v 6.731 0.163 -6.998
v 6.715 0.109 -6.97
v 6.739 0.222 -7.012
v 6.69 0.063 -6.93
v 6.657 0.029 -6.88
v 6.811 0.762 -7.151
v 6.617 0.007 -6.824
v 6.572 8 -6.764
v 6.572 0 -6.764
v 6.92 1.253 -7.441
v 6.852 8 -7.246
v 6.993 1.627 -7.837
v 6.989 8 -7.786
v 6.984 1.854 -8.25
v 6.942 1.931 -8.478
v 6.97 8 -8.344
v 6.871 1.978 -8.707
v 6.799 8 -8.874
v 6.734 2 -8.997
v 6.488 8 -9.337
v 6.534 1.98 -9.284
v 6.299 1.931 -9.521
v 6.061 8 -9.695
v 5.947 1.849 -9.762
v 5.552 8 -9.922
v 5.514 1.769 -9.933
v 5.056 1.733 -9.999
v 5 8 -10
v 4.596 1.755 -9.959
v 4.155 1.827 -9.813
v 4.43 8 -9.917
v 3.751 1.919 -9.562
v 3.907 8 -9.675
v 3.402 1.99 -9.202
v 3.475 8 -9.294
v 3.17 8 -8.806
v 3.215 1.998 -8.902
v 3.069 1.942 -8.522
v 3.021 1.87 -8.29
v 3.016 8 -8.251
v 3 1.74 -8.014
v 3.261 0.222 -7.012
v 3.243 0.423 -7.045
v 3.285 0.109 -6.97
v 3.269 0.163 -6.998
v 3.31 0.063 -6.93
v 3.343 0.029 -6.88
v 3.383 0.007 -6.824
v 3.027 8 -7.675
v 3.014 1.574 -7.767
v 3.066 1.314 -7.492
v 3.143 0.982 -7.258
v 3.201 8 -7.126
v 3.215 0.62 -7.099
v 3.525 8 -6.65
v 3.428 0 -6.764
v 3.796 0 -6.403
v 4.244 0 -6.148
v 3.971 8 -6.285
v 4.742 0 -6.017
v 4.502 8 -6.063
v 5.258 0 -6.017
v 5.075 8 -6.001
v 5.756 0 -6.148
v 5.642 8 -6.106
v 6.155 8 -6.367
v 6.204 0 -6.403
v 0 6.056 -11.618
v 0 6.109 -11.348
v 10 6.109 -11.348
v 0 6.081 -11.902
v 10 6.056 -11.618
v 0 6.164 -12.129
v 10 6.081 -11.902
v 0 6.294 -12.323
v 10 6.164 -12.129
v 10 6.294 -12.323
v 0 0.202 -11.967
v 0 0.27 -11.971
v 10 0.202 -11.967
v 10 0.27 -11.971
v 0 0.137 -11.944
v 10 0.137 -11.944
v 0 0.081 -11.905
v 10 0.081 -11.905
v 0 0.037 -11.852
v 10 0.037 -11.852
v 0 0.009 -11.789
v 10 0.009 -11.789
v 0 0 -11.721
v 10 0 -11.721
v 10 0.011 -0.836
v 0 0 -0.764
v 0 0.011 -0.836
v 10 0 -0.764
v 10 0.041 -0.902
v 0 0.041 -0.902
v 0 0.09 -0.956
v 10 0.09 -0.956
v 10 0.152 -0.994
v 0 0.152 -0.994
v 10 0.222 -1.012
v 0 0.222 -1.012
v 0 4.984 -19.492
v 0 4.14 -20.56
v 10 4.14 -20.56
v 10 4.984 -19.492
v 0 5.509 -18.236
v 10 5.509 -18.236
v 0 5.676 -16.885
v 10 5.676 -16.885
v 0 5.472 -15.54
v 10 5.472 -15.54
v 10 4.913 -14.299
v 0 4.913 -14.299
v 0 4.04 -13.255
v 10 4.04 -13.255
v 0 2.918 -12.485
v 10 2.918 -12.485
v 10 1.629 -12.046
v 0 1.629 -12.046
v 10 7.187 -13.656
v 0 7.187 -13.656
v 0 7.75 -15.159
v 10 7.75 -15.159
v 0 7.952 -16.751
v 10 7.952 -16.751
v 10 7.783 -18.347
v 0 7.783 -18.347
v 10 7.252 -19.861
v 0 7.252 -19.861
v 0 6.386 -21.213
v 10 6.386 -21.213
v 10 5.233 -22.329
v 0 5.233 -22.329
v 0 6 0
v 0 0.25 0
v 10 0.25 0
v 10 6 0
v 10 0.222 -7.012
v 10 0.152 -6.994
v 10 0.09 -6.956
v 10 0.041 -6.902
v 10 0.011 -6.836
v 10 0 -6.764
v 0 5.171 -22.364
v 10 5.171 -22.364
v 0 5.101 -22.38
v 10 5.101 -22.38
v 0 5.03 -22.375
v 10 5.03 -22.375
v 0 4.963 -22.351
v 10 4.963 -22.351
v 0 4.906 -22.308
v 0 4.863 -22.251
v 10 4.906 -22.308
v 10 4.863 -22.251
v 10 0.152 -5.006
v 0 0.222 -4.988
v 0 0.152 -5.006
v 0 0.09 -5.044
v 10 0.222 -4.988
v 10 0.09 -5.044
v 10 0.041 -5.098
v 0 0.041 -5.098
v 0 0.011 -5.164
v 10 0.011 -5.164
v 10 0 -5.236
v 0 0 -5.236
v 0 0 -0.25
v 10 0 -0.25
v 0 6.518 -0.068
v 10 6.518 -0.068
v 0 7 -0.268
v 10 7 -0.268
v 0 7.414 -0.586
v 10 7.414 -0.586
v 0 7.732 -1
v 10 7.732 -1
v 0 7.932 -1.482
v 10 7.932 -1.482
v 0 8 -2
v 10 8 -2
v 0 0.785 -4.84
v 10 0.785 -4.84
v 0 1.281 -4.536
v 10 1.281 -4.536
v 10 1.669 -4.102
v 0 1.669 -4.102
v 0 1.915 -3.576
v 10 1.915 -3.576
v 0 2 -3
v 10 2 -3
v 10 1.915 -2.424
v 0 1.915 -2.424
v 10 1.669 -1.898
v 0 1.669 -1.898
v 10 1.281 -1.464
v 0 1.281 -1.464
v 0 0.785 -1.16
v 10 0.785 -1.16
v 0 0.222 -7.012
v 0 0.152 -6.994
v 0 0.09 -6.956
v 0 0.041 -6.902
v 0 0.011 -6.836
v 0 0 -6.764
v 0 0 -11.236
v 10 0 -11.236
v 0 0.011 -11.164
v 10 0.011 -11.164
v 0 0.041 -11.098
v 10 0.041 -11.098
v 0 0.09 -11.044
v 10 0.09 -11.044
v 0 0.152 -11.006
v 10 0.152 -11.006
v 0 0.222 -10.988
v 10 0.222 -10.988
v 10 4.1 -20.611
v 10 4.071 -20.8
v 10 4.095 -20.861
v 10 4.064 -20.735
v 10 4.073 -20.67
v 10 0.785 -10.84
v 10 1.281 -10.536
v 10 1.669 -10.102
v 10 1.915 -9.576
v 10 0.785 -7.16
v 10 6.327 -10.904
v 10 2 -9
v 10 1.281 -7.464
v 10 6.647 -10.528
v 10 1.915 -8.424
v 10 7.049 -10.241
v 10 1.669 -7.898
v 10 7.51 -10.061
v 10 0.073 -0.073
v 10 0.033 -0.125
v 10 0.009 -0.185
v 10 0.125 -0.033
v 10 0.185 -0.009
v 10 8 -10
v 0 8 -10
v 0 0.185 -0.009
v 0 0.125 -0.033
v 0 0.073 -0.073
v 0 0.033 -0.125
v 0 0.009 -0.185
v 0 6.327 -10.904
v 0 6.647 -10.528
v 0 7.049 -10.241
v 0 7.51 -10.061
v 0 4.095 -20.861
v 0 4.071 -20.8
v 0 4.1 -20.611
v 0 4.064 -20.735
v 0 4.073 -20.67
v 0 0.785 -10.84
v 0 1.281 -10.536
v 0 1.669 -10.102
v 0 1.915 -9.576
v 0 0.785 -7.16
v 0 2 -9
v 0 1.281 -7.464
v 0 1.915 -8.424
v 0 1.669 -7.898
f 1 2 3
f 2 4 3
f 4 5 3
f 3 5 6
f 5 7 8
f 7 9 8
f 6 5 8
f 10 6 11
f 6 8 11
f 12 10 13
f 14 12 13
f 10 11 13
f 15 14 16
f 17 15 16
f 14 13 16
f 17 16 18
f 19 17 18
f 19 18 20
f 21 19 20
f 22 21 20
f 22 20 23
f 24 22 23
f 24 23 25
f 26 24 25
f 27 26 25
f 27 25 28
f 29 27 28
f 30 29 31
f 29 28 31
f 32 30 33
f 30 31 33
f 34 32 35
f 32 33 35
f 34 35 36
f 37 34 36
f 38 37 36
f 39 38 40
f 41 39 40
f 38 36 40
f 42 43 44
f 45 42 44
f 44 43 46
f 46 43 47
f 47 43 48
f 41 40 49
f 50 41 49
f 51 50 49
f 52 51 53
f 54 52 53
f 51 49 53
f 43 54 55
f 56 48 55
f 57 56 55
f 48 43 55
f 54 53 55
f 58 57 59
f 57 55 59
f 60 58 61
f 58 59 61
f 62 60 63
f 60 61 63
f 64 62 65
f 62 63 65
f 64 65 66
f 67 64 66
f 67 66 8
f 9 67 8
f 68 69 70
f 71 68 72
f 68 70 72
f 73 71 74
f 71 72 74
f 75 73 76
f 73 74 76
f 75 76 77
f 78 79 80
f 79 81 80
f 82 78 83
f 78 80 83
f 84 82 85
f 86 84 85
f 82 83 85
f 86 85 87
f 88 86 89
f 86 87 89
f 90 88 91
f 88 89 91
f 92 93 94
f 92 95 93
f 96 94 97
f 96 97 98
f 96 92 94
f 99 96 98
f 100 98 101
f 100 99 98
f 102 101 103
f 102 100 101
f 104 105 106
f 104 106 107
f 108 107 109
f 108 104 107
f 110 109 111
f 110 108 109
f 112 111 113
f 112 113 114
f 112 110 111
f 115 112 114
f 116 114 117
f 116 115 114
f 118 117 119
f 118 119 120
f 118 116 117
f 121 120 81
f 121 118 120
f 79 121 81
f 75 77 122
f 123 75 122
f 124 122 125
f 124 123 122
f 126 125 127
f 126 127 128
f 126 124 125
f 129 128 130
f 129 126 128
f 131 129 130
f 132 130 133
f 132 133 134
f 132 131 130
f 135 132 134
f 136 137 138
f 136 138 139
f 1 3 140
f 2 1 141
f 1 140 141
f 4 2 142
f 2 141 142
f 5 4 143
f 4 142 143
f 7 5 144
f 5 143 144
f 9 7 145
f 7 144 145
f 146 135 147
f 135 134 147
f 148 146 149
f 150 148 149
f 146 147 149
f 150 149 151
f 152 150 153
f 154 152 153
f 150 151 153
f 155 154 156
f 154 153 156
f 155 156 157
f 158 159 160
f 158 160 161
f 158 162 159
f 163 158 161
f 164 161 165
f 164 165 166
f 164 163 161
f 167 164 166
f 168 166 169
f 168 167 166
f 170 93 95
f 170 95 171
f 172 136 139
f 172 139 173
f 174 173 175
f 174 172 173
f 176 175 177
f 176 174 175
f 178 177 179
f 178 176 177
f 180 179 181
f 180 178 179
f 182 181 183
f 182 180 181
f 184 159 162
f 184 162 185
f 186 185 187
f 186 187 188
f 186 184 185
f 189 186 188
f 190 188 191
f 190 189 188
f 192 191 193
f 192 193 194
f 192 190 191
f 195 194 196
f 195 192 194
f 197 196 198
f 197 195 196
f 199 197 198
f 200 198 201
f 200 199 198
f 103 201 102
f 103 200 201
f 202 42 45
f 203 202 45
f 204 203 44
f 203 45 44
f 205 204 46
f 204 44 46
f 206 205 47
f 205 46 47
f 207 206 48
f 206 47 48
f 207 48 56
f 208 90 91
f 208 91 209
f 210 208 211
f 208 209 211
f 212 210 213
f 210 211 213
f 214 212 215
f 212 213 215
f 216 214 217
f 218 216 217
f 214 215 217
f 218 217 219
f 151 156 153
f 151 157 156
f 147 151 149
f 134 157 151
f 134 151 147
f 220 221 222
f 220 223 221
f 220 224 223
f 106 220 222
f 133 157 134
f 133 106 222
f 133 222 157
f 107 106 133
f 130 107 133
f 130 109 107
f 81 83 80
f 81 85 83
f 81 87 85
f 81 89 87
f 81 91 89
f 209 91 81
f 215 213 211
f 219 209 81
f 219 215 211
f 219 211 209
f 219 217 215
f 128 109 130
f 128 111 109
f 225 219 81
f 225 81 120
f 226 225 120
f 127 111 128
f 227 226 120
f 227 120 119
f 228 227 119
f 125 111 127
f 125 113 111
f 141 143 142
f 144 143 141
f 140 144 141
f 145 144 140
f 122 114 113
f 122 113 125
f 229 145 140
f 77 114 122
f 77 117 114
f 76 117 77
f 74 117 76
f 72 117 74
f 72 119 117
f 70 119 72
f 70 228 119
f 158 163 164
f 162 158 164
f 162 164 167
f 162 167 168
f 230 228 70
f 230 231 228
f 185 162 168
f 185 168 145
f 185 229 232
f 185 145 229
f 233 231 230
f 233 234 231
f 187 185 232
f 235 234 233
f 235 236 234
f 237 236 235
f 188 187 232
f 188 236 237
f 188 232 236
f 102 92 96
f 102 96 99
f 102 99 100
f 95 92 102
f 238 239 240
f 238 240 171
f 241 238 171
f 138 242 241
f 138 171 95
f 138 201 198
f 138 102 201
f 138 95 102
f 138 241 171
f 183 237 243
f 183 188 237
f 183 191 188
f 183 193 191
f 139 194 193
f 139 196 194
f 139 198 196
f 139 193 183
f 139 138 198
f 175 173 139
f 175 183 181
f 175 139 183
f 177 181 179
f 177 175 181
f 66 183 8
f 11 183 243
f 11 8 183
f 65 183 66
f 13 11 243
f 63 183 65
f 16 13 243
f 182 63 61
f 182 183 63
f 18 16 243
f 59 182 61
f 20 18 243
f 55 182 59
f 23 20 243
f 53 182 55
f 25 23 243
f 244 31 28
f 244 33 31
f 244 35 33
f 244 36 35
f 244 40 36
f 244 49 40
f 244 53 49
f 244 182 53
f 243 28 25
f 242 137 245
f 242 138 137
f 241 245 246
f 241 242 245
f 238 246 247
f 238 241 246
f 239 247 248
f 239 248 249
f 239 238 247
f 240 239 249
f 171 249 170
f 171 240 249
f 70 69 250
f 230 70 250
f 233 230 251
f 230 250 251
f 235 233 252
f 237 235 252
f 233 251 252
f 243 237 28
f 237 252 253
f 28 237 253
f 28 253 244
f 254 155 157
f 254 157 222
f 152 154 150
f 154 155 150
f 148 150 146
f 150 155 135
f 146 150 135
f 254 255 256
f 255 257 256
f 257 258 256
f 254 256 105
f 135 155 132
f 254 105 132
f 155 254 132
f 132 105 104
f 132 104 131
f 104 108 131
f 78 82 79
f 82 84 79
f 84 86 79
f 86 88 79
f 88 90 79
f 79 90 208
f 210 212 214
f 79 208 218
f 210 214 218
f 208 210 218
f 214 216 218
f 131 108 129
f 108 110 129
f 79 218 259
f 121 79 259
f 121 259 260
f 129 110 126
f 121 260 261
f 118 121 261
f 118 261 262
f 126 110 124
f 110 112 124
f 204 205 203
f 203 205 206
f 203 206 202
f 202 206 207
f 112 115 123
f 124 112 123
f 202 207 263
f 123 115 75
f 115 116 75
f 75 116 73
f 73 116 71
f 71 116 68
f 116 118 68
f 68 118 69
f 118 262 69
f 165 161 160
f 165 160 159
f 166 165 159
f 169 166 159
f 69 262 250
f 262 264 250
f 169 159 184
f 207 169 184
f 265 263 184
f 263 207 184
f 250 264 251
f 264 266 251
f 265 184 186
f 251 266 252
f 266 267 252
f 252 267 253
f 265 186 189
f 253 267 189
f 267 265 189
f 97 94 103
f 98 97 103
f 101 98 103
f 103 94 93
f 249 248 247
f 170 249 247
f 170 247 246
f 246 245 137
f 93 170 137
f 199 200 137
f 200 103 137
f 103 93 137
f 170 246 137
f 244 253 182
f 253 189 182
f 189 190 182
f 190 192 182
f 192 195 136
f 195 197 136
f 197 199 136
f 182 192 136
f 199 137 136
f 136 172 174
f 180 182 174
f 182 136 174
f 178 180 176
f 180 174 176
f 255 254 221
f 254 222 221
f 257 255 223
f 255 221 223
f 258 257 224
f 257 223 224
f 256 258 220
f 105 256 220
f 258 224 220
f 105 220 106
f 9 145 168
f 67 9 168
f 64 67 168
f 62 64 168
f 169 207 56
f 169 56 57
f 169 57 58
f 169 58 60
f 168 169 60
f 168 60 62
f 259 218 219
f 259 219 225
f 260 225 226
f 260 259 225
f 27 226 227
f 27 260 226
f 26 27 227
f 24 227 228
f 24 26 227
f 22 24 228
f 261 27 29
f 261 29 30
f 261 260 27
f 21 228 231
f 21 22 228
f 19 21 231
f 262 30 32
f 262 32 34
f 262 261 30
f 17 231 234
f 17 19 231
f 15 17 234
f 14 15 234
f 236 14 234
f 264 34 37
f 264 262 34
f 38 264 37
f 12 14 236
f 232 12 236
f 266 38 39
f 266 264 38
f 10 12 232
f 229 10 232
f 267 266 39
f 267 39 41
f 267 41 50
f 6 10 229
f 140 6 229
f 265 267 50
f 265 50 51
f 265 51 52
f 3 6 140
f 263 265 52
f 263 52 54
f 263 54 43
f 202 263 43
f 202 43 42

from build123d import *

# Parameters (mm, degrees)
BOSS_EXTRUDE1_DEPTH = 10
FILLET1_START       = -1
FILLET1_DEPTH       = 12
FILLET1_2_DEPTH     = 10
FILLET2_R           = 1
FILLET3_R           = 0.25
SKETCH2_R           = 2
CUT_EXTRUDE1_DEPTH  = 26.785330572


with BuildPart() as part:
    # Sketch1 → Boss-Extrude1 (new body)
    with BuildSketch(Plane(origin=(0, 0, 0), x_dir=(0, 0, -1), z_dir=(1, 0, 0))):
        with BuildLine():
            Line((0, 0), (0, 8))
            Line((0, 8), (10, 8))
            Line((10, 8), (10, 6))
            Line((10, 6), (12, 6))
            ThreePointArc((12, 6), (17.480620462, 7.92151485), (22.5, 5))
            Line((22.5, 5), (20.689313396, 4))
            ThreePointArc((20.689313396, 4), (14.863284967, 5.218025808), (12, 0))
            Line((12, 0), (11, 0))
            ThreePointArc((11, 0), (9, 2), (7, 0))
            Line((7, 0), (5, 0))
            ThreePointArc((5, 0), (3, 2), (1, 0))
            Line((1, 0), (0, 0))
        make_face()
    extrude(amount=BOSS_EXTRUDE1_DEPTH)

    # Fillet1: read off the stored shape, not the designer's step
    # Fillet1 outline → Fillet1 (cut)
    with BuildSketch(Plane.YZ.offset(FILLET1_START)):
        with BuildLine():
            ThreePointArc((6, 0), (7.414213562, -0.585786438), (8, -2))
            Line((8, -2), (8, 0))
            Line((8, 0), (6, 0))
        make_face()
    extrude(amount=FILLET1_DEPTH, mode=Mode.SUBTRACT)

    # Fillet1 2 outline → Fillet1 2 (add)
    with BuildSketch(Plane.YZ):
        with BuildLine():
            ThreePointArc((6, -12), (6.585786438, -10.585786438), (8, -10))
            Line((8, -10), (6, -10))
            Line((6, -10), (6, -12))
        make_face()
    extrude(amount=FILLET1_2_DEPTH)

    # Fillet2
    fillet2_edges = [part.edges().sort_by_distance(p)[0] for p in [
        (5, 6, -12),
    ]]
    fillet(fillet2_edges, radius=FILLET2_R)

    # Fillet3
    fillet3_edges = [part.edges().sort_by_distance(p)[0] for p in [
        (5, 0, 0),
        (5, 5, -22.5),
        (5, 4, -20.689313396),
        (5, 0, -12),
        (5, 0, -11),
        (5, 0, -7),
        (5, 0, -5),
        (5, 0, -1),
    ]]
    fillet(fillet3_edges, radius=FILLET3_R)

    # Sketch2 → Cut-Extrude1 (cut, through all)
    with BuildSketch(Plane(origin=(0, 8, 0), x_dir=(1, 0, 0), z_dir=(0, 1, 0))):
        with Locations(Location((5, 8, 0), (0, 0, 321.827292373))):
            Circle(SKETCH2_R)
    extrude(amount=-CUT_EXTRUDE1_DEPTH, mode=Mode.SUBTRACT)


solid = part.part
